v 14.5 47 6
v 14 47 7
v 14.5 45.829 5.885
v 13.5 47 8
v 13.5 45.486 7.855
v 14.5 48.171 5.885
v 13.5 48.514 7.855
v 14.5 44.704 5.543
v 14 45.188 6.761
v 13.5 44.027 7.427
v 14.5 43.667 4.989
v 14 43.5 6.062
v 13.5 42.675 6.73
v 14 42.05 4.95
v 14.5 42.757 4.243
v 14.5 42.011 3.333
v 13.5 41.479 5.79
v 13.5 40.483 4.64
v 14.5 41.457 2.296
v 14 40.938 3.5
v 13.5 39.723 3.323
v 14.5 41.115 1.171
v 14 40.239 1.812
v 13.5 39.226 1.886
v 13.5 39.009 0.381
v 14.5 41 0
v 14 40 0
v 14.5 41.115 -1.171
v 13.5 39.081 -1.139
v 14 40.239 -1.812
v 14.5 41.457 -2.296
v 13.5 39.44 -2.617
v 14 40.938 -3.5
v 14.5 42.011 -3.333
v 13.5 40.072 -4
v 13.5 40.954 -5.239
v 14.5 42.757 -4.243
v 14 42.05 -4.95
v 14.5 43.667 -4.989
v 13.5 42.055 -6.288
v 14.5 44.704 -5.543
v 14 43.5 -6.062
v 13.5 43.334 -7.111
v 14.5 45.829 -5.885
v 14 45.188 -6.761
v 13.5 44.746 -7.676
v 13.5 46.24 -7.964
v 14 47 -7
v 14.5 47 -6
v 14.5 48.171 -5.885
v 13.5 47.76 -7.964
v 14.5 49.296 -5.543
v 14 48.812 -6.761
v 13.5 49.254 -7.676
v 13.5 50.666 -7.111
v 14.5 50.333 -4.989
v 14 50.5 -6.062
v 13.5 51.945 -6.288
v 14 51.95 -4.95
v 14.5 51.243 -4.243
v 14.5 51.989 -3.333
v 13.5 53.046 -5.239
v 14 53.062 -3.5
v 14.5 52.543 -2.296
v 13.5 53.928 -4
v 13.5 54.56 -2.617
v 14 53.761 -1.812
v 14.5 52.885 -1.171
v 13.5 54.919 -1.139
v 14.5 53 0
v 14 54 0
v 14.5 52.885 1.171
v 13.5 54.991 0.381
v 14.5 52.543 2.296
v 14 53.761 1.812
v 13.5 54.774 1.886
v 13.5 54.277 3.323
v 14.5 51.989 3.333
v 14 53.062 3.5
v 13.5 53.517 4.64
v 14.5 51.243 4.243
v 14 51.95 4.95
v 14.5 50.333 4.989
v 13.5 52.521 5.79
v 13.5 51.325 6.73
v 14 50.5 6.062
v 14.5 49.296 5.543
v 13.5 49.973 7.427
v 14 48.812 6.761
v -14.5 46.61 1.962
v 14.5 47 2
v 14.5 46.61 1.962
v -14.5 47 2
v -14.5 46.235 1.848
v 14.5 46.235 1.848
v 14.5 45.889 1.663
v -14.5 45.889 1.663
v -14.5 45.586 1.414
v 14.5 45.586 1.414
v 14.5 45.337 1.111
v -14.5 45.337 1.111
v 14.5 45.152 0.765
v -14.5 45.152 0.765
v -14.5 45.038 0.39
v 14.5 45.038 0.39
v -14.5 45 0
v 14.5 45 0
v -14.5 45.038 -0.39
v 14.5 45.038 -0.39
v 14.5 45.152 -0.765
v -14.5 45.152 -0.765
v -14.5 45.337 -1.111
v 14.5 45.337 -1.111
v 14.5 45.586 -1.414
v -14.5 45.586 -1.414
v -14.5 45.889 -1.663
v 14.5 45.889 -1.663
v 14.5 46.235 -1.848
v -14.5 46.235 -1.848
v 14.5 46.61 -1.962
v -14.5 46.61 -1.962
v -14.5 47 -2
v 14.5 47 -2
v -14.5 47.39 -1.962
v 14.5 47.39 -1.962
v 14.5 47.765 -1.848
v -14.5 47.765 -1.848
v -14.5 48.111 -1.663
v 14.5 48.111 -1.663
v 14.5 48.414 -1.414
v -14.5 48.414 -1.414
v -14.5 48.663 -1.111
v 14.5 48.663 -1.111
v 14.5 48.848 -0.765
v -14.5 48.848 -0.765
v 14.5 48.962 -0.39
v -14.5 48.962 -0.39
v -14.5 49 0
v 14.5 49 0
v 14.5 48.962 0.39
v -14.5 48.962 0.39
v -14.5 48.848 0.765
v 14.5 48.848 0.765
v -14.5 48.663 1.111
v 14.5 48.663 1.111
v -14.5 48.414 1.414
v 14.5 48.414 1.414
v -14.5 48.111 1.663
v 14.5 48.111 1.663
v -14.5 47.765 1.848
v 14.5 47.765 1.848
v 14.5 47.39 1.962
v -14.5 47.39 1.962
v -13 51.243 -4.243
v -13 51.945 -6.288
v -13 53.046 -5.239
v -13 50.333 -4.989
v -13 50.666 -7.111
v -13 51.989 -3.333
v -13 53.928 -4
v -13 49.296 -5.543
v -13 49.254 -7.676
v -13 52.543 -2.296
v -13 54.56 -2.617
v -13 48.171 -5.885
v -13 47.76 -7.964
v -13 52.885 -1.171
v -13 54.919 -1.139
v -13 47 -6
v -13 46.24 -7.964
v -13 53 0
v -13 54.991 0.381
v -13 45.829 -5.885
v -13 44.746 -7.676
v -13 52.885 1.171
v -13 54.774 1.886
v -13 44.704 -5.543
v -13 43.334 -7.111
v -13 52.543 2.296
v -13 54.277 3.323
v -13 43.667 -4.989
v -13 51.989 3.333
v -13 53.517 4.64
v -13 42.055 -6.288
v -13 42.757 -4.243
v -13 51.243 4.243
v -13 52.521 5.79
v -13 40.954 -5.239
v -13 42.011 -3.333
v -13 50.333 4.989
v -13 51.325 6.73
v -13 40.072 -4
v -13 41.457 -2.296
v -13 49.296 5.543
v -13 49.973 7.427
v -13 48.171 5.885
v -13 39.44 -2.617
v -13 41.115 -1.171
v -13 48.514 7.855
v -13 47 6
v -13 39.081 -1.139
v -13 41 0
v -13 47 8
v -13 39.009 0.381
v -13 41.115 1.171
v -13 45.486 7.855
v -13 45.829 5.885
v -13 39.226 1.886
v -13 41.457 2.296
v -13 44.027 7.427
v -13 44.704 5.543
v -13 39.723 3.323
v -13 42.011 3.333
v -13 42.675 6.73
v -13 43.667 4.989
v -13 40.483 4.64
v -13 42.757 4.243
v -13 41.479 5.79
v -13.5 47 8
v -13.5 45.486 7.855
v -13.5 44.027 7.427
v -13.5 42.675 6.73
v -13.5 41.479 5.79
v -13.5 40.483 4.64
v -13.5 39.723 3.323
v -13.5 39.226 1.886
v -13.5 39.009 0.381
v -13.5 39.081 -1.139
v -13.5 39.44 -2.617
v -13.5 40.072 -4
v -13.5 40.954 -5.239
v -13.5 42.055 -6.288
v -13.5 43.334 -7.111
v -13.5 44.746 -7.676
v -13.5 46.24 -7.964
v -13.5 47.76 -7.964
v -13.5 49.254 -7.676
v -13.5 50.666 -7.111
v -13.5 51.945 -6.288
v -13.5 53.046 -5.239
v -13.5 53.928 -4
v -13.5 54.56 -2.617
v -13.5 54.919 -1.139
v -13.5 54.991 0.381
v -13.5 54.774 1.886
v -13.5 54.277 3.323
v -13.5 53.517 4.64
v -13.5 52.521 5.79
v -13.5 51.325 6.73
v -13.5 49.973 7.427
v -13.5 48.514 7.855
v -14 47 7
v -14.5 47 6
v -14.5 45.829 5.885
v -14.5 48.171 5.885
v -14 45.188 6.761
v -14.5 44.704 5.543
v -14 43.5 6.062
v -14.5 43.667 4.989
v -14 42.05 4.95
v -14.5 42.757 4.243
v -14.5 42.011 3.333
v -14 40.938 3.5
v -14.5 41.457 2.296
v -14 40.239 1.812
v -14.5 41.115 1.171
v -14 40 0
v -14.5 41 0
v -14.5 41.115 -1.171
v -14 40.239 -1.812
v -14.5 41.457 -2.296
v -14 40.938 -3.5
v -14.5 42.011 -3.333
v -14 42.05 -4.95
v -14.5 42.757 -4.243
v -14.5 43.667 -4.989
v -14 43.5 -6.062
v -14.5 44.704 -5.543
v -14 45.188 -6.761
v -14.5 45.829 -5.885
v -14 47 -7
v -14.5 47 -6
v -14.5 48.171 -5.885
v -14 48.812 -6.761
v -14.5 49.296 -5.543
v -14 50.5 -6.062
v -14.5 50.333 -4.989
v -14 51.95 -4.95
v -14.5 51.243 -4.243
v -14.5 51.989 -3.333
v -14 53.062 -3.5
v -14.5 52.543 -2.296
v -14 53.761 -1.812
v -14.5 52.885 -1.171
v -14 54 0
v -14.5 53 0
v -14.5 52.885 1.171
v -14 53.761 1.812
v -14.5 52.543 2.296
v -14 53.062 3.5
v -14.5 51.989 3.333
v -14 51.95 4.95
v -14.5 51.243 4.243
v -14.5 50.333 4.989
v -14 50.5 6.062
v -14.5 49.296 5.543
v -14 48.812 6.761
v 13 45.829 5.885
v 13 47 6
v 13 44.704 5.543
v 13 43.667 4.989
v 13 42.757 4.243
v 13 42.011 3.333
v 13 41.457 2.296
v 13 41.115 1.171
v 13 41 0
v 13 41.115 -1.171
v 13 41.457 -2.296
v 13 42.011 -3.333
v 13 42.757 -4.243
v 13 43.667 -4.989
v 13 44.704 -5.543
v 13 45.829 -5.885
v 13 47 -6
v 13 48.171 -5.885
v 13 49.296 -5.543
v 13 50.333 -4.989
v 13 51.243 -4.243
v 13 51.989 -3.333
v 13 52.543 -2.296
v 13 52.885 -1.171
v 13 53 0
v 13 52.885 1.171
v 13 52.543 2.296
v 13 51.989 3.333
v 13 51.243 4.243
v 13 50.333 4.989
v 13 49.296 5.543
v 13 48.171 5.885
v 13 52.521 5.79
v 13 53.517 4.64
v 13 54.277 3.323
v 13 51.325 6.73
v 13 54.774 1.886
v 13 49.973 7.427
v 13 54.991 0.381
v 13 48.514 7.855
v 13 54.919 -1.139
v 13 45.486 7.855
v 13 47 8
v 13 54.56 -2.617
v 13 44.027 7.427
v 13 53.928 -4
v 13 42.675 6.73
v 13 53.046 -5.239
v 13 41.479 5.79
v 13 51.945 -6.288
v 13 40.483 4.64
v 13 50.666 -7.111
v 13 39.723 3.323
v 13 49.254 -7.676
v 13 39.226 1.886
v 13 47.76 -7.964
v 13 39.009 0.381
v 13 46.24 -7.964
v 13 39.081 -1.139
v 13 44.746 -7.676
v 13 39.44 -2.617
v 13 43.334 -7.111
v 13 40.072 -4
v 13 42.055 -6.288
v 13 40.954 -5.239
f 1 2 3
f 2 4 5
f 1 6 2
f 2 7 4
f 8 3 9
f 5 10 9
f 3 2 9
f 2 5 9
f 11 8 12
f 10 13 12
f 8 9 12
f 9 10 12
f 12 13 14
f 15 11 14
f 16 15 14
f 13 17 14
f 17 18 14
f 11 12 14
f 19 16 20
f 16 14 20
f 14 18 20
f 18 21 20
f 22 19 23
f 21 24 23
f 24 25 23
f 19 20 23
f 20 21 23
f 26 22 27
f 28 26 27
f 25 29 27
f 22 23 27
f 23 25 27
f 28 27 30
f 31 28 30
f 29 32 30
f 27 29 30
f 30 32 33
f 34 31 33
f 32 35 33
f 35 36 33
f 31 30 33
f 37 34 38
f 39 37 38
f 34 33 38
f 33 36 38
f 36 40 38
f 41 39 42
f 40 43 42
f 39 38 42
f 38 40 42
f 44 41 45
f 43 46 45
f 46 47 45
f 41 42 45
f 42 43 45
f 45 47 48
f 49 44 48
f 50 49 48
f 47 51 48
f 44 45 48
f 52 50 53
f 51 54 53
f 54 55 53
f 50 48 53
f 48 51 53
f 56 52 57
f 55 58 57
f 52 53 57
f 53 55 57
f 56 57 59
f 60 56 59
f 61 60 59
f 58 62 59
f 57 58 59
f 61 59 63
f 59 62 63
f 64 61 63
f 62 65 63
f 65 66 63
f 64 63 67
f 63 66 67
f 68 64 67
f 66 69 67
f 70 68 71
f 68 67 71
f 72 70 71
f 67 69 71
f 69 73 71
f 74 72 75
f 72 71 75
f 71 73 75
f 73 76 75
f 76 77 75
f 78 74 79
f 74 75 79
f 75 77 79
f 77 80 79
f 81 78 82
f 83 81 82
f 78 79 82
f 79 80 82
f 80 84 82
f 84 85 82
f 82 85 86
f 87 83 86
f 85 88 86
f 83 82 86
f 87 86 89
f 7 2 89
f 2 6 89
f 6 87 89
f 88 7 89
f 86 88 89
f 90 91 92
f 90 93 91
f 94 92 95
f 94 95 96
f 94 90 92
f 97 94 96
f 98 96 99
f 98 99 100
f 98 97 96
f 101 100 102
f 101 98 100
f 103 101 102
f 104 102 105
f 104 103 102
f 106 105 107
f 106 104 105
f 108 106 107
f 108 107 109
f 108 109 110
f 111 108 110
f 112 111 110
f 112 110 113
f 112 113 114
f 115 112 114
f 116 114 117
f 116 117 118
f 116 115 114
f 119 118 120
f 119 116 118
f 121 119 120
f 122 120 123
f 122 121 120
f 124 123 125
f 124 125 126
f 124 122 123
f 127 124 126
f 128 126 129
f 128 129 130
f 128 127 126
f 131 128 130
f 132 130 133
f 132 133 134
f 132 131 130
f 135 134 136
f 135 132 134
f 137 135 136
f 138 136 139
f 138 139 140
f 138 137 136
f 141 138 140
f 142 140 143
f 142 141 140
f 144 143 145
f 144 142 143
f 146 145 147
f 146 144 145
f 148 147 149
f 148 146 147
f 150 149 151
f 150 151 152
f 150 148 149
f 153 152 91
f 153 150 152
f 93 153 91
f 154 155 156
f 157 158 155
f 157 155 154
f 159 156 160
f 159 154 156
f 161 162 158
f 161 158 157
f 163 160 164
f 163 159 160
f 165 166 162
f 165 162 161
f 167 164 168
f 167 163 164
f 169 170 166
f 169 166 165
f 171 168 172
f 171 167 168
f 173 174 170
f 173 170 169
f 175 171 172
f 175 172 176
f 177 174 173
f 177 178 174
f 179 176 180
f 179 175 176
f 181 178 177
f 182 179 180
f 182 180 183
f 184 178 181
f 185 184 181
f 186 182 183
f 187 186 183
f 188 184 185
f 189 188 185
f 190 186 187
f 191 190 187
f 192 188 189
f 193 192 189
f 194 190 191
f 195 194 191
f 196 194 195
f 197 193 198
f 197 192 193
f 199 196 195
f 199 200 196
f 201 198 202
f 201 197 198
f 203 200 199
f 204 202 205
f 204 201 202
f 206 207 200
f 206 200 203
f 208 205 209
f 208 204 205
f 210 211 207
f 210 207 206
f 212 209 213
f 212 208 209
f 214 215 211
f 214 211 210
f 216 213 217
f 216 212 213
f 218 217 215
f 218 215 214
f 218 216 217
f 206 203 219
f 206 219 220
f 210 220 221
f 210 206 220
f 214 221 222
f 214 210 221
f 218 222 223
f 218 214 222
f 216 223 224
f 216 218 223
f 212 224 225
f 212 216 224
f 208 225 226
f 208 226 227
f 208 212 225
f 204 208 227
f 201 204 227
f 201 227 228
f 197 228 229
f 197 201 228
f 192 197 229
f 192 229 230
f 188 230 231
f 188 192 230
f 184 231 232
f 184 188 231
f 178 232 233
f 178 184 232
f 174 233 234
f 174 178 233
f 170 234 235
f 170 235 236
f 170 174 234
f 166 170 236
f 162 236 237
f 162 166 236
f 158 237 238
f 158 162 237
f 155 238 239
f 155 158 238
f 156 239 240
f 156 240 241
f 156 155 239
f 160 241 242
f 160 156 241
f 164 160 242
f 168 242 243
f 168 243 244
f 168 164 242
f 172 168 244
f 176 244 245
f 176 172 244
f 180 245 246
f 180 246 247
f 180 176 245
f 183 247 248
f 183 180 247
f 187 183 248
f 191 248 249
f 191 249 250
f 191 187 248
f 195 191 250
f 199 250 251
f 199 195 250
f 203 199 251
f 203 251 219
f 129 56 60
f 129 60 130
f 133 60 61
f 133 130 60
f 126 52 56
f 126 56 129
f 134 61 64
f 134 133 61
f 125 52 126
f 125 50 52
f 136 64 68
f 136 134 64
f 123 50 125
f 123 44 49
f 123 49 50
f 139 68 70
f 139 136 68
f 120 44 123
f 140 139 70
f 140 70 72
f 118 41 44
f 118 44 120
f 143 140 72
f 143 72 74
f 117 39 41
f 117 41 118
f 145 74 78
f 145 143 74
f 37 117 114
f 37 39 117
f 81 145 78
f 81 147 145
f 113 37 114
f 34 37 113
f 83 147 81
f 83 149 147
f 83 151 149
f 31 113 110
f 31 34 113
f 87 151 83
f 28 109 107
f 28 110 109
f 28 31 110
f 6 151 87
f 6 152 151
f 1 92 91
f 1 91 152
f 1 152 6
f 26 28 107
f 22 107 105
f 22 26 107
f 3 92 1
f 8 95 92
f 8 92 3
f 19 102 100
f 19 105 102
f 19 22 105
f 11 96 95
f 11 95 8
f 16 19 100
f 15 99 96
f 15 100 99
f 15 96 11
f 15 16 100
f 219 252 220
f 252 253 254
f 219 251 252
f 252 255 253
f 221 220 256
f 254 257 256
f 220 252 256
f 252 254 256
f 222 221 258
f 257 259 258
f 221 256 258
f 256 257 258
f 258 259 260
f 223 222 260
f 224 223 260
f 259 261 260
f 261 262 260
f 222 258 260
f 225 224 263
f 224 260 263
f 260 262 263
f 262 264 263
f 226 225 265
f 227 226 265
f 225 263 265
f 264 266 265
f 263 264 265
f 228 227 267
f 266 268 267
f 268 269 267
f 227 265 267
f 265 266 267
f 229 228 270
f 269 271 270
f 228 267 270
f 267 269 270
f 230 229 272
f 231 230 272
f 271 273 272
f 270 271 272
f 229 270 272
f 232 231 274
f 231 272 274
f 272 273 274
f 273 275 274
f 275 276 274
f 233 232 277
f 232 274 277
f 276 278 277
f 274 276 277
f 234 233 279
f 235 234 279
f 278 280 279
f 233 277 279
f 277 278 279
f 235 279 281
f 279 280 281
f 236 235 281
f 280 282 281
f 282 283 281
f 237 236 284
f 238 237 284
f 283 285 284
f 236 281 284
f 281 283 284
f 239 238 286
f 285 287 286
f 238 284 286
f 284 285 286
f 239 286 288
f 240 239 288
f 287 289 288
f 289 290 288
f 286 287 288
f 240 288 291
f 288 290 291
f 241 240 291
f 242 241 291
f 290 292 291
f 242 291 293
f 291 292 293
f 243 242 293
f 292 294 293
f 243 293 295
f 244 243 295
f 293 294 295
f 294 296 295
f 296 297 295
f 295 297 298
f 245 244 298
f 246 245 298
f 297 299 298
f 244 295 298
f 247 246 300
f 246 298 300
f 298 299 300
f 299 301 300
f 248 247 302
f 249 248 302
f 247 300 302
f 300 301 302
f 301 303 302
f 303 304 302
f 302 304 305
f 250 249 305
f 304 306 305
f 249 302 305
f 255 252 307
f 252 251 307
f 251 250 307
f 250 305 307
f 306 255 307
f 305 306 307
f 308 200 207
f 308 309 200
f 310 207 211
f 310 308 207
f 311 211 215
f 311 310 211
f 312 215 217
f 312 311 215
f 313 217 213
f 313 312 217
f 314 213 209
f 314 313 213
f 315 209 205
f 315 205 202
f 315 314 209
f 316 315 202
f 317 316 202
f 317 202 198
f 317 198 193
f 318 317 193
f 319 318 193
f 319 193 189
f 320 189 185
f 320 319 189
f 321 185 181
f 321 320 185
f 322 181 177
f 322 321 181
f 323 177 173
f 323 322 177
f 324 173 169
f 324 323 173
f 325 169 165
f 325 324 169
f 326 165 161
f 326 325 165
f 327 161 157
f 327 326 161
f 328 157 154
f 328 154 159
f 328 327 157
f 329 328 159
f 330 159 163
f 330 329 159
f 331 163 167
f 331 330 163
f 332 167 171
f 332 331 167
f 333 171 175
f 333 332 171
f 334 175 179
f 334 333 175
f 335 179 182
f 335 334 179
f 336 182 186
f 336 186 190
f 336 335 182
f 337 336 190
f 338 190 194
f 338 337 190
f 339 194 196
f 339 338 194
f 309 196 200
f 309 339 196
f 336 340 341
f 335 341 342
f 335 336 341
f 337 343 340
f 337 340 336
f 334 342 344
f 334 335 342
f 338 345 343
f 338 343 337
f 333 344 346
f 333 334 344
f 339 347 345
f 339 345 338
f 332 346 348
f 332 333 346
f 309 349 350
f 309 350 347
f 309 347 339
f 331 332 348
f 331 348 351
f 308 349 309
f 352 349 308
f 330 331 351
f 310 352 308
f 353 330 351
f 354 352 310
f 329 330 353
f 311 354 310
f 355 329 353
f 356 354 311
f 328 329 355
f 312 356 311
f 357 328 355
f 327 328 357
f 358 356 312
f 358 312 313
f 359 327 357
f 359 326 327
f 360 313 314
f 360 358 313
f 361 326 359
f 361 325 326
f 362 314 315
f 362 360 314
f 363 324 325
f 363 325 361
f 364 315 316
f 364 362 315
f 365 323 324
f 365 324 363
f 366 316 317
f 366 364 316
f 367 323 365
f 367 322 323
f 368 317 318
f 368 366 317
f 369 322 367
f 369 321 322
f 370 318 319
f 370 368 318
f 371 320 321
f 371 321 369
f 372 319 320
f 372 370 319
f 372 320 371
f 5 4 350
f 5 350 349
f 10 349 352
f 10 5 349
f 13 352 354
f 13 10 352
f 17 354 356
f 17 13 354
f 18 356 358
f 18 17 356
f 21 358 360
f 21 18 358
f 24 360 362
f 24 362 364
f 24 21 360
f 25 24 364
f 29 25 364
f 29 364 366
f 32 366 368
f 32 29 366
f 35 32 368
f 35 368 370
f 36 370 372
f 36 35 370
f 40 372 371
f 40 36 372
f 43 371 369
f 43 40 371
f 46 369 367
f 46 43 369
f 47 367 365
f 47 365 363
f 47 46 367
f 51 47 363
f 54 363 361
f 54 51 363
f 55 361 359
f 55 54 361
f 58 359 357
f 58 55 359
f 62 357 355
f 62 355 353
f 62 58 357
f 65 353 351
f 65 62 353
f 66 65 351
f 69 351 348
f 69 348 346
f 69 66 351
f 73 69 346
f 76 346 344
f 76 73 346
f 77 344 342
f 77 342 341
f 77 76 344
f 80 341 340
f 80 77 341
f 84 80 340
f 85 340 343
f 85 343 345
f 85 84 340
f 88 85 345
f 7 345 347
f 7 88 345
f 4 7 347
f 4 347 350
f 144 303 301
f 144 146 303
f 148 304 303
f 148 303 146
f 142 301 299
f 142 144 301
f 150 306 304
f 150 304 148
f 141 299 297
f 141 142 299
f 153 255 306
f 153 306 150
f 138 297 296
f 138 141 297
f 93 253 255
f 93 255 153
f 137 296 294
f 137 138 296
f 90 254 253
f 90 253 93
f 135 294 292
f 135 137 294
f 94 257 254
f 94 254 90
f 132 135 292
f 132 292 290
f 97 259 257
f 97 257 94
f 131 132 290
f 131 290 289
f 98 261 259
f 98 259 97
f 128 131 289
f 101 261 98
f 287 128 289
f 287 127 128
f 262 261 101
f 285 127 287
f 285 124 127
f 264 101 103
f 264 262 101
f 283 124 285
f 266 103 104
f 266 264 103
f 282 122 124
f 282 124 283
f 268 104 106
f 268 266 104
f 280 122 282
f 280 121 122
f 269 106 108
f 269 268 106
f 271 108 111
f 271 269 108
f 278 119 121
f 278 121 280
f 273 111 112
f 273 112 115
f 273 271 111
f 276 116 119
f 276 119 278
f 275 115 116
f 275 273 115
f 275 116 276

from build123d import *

# Parameters (mm, degrees)
CHAMFER_1_SIZE  = 1
CHAMFER_1_SIZE2 = 2
CHAMFER_2_SIZE  = 2
CHAMFER_2_SIZE2 = 1


with BuildPart() as part:
    # 草图2 → 旋转1 (revolve)
    with BuildSketch(Plane.XY, mode=Mode.PRIVATE) as revolve_1_sk:
        Polygon((-13, 53), (13, 53), (13, 55), (14.5, 55), (14.5, 49), (-14.5, 49), (-14.5, 55), (-13, 55), align=None)
    revolve(revolve_1_sk.sketch.rotate(Axis((-54.733238043, 47, 0), (1, 0, 0)), 90), axis=Axis((-54.733238043, 47, 0), (1, 0, 0)))

    # 倒角1
    chamfer_1_edges = [part.edges().sort_by_distance(p)[0] for p in [
        (-14.5, 47, -8),
    ]]
    chamfer_1_side = [part.faces().sort_by_distance(p)[0] for p in [
        (-13.75, 47, -8),
    ]]
    chamfer(chamfer_1_edges, length=CHAMFER_1_SIZE, length2=CHAMFER_1_SIZE2, reference=chamfer_1_side[0])

    # 倒角2
    chamfer_2_edges = [part.edges().sort_by_distance(p)[0] for p in [
        (14.5, 47, -8),
    ]]
    chamfer_2_side = [part.faces().sort_by_distance(p)[0] for p in [
        (14.5, 47, -7.77372583),
    ]]
    chamfer(chamfer_2_edges, length=CHAMFER_2_SIZE, length2=CHAMFER_2_SIZE2, reference=chamfer_2_side[0])


solid = part.part
